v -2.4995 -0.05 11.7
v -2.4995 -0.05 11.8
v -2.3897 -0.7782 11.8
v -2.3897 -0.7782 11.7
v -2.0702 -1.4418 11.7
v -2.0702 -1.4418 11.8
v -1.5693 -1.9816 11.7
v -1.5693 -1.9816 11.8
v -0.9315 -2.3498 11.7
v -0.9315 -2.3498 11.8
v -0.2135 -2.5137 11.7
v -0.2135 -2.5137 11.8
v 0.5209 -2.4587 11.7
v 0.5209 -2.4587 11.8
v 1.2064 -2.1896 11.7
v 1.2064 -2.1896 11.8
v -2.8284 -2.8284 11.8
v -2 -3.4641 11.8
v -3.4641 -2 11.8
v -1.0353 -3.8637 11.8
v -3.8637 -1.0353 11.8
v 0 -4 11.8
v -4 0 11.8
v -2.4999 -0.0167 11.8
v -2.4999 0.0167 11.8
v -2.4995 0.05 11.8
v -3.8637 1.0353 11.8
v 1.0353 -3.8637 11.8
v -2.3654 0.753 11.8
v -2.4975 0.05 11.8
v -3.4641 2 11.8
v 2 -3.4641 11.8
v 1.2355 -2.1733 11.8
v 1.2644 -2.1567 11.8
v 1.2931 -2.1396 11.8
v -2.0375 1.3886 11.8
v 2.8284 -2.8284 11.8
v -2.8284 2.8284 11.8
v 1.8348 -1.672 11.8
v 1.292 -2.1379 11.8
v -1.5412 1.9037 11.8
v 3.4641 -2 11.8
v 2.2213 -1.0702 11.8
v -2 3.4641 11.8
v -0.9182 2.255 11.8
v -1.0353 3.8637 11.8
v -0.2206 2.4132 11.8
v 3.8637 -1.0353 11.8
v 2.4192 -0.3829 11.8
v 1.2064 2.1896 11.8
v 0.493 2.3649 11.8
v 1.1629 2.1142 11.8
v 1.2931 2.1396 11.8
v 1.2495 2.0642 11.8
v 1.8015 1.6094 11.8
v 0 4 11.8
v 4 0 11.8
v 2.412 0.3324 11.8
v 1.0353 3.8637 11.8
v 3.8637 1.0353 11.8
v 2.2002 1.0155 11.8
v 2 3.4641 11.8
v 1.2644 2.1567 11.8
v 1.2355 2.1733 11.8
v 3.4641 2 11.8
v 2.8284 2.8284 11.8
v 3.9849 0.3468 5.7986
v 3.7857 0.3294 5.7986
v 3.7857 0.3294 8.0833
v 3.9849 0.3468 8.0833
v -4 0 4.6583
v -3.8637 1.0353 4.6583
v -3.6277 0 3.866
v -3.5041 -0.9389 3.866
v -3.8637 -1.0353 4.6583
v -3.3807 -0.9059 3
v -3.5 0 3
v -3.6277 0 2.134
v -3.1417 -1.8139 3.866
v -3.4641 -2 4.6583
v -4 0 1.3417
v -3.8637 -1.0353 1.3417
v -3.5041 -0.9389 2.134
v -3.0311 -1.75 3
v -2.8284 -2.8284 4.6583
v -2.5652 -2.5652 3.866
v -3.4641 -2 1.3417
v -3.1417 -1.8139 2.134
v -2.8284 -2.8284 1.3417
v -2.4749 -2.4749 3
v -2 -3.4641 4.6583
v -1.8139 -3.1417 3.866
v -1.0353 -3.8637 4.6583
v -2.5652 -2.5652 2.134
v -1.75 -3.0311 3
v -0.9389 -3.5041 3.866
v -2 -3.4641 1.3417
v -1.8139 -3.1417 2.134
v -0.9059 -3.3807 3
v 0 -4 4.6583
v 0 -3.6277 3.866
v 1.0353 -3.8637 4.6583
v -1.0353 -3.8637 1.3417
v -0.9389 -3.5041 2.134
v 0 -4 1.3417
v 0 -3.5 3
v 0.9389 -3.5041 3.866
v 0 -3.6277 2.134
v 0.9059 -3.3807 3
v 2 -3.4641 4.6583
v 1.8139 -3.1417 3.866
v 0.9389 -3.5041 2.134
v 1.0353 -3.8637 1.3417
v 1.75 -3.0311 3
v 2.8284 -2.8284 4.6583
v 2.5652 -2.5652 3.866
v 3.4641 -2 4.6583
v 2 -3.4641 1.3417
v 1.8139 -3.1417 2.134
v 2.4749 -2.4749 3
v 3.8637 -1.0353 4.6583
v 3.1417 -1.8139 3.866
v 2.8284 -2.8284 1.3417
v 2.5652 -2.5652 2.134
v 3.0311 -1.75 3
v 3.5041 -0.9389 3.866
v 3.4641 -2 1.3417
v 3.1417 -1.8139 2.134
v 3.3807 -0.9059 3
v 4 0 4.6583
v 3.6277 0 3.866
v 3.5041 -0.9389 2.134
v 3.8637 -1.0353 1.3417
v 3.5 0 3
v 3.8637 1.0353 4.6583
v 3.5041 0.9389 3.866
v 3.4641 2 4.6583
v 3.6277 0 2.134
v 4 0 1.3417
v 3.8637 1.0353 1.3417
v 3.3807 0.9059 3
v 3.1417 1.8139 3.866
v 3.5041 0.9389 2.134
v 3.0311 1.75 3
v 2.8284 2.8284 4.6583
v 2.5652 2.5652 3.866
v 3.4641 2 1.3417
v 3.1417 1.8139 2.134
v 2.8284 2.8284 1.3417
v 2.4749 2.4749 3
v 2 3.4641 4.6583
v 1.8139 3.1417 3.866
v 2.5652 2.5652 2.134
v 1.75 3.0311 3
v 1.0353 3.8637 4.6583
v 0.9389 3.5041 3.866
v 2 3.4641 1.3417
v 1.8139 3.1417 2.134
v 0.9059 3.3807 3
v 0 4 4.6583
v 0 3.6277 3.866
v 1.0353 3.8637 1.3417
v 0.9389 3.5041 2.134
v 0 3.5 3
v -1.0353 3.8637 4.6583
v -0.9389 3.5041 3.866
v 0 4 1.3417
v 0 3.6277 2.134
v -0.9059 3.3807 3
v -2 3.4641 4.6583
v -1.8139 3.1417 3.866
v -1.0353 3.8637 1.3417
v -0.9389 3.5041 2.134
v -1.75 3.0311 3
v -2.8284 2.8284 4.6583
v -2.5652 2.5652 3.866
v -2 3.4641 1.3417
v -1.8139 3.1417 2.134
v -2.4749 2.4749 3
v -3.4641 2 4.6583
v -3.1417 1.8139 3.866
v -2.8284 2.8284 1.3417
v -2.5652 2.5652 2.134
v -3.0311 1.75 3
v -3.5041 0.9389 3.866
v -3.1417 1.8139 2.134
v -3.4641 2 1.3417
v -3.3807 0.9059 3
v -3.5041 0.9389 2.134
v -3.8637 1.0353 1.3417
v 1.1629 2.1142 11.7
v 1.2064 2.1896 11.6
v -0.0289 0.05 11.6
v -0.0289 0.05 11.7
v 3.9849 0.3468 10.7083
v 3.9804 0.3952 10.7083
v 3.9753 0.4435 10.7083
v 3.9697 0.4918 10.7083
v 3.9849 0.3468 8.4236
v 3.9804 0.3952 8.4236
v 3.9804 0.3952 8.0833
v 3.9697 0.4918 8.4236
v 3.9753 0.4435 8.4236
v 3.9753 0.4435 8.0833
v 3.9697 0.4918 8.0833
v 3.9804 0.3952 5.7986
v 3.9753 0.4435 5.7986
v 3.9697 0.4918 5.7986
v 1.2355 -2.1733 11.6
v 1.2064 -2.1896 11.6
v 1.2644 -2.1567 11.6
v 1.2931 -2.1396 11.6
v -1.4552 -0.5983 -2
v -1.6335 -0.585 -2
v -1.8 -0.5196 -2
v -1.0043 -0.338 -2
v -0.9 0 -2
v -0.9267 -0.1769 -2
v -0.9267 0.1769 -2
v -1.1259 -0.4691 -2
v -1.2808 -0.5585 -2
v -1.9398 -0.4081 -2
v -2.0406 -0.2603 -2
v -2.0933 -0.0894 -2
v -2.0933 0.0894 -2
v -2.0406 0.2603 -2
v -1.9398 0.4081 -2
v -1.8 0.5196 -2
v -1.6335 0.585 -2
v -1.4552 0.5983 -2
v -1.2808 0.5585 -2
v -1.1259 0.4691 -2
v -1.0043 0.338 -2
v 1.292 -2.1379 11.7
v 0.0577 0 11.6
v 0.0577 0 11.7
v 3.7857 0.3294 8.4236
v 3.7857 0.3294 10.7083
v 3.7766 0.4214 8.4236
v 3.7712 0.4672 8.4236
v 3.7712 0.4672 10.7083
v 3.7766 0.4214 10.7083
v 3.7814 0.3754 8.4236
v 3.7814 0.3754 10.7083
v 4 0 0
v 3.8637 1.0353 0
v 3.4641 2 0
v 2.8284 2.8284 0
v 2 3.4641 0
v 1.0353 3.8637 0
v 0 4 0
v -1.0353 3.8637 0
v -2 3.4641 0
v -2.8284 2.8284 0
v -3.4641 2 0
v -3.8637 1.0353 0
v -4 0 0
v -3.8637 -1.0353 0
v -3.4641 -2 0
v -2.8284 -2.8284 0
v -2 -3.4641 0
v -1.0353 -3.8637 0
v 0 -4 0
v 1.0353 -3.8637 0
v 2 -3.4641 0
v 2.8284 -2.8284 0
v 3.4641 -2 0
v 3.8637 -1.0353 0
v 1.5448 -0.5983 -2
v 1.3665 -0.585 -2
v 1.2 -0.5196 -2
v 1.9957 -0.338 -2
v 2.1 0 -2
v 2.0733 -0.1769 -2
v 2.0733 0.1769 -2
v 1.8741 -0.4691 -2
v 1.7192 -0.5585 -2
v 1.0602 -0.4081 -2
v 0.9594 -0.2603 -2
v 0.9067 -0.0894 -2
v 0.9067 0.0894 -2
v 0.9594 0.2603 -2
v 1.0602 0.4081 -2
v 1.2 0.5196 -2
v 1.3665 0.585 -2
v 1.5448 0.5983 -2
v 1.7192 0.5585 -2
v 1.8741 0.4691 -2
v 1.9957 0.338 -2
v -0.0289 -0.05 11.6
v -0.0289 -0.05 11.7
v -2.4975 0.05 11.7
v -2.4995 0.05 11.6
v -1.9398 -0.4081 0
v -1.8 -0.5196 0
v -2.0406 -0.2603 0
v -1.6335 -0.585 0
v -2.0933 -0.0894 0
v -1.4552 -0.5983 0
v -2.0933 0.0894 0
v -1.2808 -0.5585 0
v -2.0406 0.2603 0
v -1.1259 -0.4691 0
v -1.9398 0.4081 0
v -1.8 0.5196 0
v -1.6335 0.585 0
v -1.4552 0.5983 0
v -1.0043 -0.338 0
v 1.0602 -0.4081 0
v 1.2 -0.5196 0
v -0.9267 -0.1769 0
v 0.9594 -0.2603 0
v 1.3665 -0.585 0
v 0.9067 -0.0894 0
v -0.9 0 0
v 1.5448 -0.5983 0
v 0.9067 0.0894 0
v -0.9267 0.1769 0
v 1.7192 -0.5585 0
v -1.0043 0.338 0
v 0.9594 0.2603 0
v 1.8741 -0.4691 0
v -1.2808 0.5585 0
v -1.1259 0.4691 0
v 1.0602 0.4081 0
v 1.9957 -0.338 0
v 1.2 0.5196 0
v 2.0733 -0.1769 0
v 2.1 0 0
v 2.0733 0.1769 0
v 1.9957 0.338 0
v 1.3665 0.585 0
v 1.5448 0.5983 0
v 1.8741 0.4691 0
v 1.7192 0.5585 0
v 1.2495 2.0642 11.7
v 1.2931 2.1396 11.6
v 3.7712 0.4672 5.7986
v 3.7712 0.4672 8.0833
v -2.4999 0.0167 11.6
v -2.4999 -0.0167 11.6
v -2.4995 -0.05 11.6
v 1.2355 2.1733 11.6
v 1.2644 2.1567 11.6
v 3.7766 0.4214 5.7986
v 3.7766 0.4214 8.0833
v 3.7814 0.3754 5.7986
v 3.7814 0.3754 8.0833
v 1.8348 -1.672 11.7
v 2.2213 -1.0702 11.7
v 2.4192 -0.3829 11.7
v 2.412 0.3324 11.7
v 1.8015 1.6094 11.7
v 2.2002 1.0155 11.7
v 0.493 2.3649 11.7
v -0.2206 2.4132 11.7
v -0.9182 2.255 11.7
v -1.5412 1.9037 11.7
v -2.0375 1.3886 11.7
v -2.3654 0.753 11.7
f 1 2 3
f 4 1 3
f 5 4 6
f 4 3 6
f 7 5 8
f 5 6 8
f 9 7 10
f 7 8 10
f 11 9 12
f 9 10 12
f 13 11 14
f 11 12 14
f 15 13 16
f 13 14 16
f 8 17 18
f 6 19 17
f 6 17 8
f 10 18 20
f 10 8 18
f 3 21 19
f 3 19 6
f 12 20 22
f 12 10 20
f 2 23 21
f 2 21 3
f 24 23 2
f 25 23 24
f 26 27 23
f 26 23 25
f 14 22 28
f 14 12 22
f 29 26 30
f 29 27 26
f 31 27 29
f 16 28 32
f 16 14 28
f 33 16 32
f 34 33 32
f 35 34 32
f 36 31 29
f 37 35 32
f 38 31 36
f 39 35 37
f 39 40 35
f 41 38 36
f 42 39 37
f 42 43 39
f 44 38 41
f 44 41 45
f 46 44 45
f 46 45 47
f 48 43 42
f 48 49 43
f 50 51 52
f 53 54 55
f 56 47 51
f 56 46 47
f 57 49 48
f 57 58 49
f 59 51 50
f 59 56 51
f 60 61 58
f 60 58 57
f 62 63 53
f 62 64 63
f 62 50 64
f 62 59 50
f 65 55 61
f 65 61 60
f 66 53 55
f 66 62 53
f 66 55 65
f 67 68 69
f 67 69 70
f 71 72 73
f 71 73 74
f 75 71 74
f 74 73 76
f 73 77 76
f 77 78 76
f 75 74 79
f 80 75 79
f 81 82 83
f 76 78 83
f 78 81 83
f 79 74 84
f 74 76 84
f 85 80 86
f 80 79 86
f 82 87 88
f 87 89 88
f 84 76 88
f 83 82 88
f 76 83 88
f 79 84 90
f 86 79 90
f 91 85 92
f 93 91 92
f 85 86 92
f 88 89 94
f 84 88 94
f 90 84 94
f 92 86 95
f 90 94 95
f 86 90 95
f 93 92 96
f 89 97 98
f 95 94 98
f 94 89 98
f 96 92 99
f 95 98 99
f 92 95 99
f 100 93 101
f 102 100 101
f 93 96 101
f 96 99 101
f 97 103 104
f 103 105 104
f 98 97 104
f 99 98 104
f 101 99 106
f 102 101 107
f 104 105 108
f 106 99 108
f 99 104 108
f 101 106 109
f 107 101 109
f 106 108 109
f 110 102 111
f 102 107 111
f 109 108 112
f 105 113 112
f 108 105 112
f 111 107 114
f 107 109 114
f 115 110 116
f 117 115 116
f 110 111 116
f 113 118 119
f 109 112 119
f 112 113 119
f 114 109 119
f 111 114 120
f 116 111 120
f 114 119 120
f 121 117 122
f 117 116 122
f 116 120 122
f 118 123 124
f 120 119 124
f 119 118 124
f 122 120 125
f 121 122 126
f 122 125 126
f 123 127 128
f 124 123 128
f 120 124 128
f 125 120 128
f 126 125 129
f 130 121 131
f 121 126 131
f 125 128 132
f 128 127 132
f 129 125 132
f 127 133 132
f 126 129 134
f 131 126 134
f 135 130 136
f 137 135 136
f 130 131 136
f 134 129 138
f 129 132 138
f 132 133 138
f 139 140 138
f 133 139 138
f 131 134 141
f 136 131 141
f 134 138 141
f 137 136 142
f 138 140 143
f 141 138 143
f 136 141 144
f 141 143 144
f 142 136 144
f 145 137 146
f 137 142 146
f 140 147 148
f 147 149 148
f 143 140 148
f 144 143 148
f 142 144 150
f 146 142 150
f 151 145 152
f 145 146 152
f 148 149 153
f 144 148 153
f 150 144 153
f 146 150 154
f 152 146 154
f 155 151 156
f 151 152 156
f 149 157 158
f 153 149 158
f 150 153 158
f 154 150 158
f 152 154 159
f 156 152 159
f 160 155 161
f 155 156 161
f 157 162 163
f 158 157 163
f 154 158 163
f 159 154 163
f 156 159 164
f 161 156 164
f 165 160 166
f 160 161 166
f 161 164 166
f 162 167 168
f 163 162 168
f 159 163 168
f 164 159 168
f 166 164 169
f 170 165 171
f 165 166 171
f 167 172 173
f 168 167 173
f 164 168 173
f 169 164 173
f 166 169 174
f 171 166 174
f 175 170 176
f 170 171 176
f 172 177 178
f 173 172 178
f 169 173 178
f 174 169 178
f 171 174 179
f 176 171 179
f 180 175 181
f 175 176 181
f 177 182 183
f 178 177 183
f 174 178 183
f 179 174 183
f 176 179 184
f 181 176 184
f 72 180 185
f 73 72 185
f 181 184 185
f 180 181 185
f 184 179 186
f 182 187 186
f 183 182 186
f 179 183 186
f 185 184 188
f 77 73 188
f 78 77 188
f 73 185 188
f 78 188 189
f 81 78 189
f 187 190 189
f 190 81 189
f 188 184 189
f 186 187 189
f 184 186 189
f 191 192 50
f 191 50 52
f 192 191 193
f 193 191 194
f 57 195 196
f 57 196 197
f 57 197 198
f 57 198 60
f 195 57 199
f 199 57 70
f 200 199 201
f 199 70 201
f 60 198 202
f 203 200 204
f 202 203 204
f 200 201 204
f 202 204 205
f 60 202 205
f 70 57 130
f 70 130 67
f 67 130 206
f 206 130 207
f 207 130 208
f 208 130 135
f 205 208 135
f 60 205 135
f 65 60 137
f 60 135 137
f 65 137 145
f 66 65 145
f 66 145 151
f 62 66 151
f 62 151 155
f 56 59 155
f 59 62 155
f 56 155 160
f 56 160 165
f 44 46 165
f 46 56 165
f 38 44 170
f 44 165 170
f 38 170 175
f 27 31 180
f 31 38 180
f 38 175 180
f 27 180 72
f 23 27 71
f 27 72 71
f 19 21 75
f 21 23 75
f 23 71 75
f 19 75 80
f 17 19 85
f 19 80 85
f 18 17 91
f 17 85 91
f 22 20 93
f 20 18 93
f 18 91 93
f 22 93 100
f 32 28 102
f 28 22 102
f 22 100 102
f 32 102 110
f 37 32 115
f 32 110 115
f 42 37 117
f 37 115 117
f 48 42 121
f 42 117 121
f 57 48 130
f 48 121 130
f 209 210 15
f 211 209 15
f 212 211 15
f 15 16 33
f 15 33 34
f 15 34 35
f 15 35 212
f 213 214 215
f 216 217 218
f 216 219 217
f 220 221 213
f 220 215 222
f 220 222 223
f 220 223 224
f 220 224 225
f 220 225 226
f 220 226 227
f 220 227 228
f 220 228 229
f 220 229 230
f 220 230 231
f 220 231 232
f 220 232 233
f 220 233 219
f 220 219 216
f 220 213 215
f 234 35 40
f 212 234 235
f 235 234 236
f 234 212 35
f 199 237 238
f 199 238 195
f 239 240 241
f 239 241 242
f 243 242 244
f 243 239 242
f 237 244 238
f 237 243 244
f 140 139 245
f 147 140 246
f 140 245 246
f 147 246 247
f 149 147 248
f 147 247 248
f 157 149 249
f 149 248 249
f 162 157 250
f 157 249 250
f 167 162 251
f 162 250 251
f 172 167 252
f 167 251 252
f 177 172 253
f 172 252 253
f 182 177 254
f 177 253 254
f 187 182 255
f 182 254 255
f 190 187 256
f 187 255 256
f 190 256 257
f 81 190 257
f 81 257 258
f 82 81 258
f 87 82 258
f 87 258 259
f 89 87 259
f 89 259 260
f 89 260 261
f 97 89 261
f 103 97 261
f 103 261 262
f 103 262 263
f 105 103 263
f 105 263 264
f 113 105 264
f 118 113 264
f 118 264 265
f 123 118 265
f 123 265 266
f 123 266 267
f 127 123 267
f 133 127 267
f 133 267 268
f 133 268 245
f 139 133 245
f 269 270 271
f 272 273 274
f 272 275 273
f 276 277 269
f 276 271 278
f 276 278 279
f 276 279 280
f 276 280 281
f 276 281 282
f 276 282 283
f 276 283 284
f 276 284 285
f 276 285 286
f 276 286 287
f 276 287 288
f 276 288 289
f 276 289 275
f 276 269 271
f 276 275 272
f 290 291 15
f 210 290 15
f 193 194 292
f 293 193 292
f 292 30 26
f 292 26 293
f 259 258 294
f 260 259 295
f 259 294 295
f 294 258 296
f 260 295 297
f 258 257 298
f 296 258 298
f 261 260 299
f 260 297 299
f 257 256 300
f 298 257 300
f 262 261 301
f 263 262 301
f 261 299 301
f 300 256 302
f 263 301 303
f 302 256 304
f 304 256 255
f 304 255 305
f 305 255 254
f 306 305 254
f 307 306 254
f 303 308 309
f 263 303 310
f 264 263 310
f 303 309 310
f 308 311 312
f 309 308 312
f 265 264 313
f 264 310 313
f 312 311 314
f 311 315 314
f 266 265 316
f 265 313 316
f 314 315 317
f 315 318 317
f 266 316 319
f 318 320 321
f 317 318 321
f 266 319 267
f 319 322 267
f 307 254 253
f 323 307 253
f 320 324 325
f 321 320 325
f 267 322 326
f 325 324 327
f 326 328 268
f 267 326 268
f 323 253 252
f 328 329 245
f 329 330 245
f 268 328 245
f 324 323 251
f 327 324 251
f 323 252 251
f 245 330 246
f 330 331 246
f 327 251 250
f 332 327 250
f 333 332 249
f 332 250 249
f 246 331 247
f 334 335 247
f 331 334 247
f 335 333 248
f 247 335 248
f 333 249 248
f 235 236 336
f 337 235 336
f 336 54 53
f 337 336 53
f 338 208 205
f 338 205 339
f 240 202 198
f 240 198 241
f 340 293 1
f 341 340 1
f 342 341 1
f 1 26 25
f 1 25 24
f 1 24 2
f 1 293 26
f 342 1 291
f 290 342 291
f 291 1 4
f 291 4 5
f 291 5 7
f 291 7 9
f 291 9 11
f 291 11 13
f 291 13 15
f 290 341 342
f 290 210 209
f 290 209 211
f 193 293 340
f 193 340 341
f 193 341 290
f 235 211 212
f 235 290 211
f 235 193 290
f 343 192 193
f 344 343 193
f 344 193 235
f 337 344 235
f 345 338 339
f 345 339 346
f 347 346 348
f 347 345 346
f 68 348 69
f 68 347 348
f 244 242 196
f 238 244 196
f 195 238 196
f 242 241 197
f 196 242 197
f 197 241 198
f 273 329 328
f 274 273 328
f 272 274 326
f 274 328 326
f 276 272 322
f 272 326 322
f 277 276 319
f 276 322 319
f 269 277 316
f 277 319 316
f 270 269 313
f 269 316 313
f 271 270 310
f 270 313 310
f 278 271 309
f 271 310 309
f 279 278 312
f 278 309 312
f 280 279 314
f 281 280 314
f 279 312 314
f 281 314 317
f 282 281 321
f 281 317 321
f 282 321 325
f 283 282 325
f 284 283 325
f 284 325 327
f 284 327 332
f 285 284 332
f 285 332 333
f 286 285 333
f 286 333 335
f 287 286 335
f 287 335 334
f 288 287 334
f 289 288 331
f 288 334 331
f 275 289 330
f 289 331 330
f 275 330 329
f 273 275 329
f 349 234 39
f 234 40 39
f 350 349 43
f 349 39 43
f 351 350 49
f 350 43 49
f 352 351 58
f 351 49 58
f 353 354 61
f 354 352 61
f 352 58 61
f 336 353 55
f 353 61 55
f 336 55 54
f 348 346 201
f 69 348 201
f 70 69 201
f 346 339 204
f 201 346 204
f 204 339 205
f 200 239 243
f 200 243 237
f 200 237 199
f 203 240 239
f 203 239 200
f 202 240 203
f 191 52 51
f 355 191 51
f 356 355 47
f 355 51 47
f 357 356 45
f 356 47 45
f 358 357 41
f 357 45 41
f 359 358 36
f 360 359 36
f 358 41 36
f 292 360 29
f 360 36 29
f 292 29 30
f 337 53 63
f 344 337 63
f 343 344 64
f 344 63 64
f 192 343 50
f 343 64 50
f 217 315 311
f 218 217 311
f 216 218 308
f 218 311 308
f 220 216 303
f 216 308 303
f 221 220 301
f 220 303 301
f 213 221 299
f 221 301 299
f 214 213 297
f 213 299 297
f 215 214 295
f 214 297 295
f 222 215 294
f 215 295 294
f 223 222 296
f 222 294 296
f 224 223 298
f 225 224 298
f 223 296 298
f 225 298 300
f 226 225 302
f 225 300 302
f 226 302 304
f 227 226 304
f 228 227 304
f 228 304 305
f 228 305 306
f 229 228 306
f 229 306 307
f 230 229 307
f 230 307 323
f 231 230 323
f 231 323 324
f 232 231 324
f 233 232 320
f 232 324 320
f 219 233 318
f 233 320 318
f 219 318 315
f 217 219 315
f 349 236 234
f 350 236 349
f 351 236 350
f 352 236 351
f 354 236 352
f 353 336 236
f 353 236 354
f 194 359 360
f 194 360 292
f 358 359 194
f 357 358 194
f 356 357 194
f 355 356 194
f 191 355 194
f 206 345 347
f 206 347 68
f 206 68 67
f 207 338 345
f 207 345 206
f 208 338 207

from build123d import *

# Parameters (mm, degrees)
SKETCH_1_R          = 4
EXTRUDE_1_DEPTH     = 12
SKETCH_2_R          = 6
CUT_EXTRUDE_1_DEPTH = 0.2
CUT_EXTRUDE_2_DEPTH = 0.2
SKETCH_5_R          = 0.6
EXTRUDE_2_DEPTH     = 2
SKETCH_7_R          = 2.470632437
CUT_EXTRUDE_3_DEPTH = 0.1
WRAP_START          = 5.798600642
WRAP_1_DEPTH        = 2.284722222
WRAP_START_2        = 8.423600642
WRAP_1_2_DEPTH      = 2.284722222


# Read off the part's stored shape, not the designer's step: 包覆1
with BuildPart() as part:
    # 草图1 → 凸台-拉伸1 (new body)
    with BuildSketch(Plane.XY):
        Circle(SKETCH_1_R)
    extrude(amount=EXTRUDE_1_DEPTH)

    # 草图2 → 切除-拉伸1 (cut)
    with BuildSketch(Plane.XY.offset(12)):
        Circle(SKETCH_2_R)
    extrude(amount=-CUT_EXTRUDE_1_DEPTH, mode=Mode.SUBTRACT)

    # 草图3 → 切除-拉伸2 (cut)
    with BuildSketch(Plane.XY.offset(11.8)):
        with BuildLine():
            Line((-0.04330127, 0.025), (-0.028867513, 0.05))
            Line((-0.028867513, 0.05), (-2.49949995, 0.05))
            ThreePointArc((-2.49949995, 0.05), (-2.5, 0), (-2.49949995, -0.05))
            Line((-2.49949995, -0.05), (-0.028867513, -0.05))
            Line((-0.028867513, -0.05), (-0.04330127, -0.025))
            Line((-0.04330127, -0.025), (0, 0))
            Line((0, 0), (-0.04330127, 0.025))
        make_face()
        with BuildLine():
            Line((0.04330127, -0.025), (0, 0))
            Line((0, 0), (0, -0.05))
            Line((0, -0.05), (-0.028867513, -0.05))
            Line((-0.028867513, -0.05), (1.206448705, -2.189630453))
            ThreePointArc((1.206448705, -2.189630453), (1.25, -2.165063509), (1.293051245, -2.139630453))
            Line((1.293051245, -2.139630453), (0.057735027, 0))
            Line((0.057735027, 0), (0.04330127, -0.025))
        make_face()
        with BuildLine():
            Line((-0.028867513, 0.05), (0, 0.05))
            Line((0, 0.05), (0, 0))
            Line((0, 0), (0.04330127, 0.025))
            Line((0.04330127, 0.025), (0.057735027, 0))
            Line((0.057735027, 0), (1.293051245, 2.139630453))
            ThreePointArc((1.293051245, 2.139630453), (1.25, 2.165063509), (1.206448705, 2.189630453))
            Line((1.206448705, 2.189630453), (-0.028867513, 0.05))
        make_face()
        Polygon((0, 0), (0, 0.05), (-0.028867513, 0.05), (-0.04330127, 0.025), align=None)
        Polygon((0, -0.05), (0, 0), (-0.04330127, -0.025), (-0.028867513, -0.05), align=None)
        Polygon((0.04330127, 0.025), (0, 0), (0.04330127, -0.025), (0.057735027, 0), align=None)
    extrude(amount=-CUT_EXTRUDE_2_DEPTH, mode=Mode.SUBTRACT)

    # 草图4 → 切除-旋转1 (revolve, cut)
    with BuildSketch(Plane(origin=(0, 0, 0), x_dir=(1, 0, 0), z_dir=(0, 1, 0))):
        with BuildLine():
            Line((-4.318421305, -0.940700508), (-4.318421305, -5.059299492))
            ThreePointArc((-4.318421305, -5.059299492), (-3.5, -3), (-4.318421305, -0.940700508))
        make_face()
    revolve(axis=Axis((0, 0, 0), (0, 0, 1)), mode=Mode.SUBTRACT)

    # 草图5 → 凸台-拉伸2 (add)
    with BuildSketch(Plane(origin=(0, 0, 0), x_dir=(-1, 0, 0), z_dir=(0, 0, -1))):
        with Locations(Location((1.5, 0, 0), (0, 0, 180))):
            Circle(SKETCH_5_R)
        with Locations(Location((-1.5, 0, 0), (0, 0, 180))):
            Circle(SKETCH_5_R)
    extrude(amount=EXTRUDE_2_DEPTH)

    # 草图7 → 切除-拉伸3 (cut)
    with BuildSketch(Plane.XY.offset(11.8)):
        with Locations((-0.028867513, -0.05)):
            Circle(SKETCH_7_R)
    extrude(amount=-CUT_EXTRUDE_3_DEPTH, mode=Mode.SUBTRACT)

    # 包覆1 outline → 包覆1 (cut)
    with BuildSketch(Plane.XY.offset(WRAP_START)):
        with BuildLine():
            Line((3.969650484, 0.491807924), (3.77116796, 0.467217528))
            ThreePointArc((3.77116796, 0.467217528), (3.779057907, 0.398398459), (3.785692099, 0.329447005))
            Line((3.785692099, 0.329447005), (3.984939052, 0.346786321))
            ThreePointArc((3.984939052, 0.346786321), (3.977955692, 0.419366799), (3.969650484, 0.491807924))
        make_face()
    extrude(amount=WRAP_1_DEPTH, mode=Mode.SUBTRACT)

    # Wrap 1 2 outline → Wrap 1 2 (cut)
    with BuildSketch(Plane.XY.offset(WRAP_START_2)):
        with BuildLine():
            Line((3.969650484, 0.491807924), (3.77116796, 0.467217528))
            ThreePointArc((3.77116796, 0.467217528), (3.779057907, 0.398398459), (3.785692099, 0.329447005))
            Line((3.785692099, 0.329447005), (3.984939052, 0.346786321))
            ThreePointArc((3.984939052, 0.346786321), (3.977955692, 0.419366799), (3.969650484, 0.491807924))
        make_face()
    extrude(amount=WRAP_1_2_DEPTH, mode=Mode.SUBTRACT)


solid = part.part
